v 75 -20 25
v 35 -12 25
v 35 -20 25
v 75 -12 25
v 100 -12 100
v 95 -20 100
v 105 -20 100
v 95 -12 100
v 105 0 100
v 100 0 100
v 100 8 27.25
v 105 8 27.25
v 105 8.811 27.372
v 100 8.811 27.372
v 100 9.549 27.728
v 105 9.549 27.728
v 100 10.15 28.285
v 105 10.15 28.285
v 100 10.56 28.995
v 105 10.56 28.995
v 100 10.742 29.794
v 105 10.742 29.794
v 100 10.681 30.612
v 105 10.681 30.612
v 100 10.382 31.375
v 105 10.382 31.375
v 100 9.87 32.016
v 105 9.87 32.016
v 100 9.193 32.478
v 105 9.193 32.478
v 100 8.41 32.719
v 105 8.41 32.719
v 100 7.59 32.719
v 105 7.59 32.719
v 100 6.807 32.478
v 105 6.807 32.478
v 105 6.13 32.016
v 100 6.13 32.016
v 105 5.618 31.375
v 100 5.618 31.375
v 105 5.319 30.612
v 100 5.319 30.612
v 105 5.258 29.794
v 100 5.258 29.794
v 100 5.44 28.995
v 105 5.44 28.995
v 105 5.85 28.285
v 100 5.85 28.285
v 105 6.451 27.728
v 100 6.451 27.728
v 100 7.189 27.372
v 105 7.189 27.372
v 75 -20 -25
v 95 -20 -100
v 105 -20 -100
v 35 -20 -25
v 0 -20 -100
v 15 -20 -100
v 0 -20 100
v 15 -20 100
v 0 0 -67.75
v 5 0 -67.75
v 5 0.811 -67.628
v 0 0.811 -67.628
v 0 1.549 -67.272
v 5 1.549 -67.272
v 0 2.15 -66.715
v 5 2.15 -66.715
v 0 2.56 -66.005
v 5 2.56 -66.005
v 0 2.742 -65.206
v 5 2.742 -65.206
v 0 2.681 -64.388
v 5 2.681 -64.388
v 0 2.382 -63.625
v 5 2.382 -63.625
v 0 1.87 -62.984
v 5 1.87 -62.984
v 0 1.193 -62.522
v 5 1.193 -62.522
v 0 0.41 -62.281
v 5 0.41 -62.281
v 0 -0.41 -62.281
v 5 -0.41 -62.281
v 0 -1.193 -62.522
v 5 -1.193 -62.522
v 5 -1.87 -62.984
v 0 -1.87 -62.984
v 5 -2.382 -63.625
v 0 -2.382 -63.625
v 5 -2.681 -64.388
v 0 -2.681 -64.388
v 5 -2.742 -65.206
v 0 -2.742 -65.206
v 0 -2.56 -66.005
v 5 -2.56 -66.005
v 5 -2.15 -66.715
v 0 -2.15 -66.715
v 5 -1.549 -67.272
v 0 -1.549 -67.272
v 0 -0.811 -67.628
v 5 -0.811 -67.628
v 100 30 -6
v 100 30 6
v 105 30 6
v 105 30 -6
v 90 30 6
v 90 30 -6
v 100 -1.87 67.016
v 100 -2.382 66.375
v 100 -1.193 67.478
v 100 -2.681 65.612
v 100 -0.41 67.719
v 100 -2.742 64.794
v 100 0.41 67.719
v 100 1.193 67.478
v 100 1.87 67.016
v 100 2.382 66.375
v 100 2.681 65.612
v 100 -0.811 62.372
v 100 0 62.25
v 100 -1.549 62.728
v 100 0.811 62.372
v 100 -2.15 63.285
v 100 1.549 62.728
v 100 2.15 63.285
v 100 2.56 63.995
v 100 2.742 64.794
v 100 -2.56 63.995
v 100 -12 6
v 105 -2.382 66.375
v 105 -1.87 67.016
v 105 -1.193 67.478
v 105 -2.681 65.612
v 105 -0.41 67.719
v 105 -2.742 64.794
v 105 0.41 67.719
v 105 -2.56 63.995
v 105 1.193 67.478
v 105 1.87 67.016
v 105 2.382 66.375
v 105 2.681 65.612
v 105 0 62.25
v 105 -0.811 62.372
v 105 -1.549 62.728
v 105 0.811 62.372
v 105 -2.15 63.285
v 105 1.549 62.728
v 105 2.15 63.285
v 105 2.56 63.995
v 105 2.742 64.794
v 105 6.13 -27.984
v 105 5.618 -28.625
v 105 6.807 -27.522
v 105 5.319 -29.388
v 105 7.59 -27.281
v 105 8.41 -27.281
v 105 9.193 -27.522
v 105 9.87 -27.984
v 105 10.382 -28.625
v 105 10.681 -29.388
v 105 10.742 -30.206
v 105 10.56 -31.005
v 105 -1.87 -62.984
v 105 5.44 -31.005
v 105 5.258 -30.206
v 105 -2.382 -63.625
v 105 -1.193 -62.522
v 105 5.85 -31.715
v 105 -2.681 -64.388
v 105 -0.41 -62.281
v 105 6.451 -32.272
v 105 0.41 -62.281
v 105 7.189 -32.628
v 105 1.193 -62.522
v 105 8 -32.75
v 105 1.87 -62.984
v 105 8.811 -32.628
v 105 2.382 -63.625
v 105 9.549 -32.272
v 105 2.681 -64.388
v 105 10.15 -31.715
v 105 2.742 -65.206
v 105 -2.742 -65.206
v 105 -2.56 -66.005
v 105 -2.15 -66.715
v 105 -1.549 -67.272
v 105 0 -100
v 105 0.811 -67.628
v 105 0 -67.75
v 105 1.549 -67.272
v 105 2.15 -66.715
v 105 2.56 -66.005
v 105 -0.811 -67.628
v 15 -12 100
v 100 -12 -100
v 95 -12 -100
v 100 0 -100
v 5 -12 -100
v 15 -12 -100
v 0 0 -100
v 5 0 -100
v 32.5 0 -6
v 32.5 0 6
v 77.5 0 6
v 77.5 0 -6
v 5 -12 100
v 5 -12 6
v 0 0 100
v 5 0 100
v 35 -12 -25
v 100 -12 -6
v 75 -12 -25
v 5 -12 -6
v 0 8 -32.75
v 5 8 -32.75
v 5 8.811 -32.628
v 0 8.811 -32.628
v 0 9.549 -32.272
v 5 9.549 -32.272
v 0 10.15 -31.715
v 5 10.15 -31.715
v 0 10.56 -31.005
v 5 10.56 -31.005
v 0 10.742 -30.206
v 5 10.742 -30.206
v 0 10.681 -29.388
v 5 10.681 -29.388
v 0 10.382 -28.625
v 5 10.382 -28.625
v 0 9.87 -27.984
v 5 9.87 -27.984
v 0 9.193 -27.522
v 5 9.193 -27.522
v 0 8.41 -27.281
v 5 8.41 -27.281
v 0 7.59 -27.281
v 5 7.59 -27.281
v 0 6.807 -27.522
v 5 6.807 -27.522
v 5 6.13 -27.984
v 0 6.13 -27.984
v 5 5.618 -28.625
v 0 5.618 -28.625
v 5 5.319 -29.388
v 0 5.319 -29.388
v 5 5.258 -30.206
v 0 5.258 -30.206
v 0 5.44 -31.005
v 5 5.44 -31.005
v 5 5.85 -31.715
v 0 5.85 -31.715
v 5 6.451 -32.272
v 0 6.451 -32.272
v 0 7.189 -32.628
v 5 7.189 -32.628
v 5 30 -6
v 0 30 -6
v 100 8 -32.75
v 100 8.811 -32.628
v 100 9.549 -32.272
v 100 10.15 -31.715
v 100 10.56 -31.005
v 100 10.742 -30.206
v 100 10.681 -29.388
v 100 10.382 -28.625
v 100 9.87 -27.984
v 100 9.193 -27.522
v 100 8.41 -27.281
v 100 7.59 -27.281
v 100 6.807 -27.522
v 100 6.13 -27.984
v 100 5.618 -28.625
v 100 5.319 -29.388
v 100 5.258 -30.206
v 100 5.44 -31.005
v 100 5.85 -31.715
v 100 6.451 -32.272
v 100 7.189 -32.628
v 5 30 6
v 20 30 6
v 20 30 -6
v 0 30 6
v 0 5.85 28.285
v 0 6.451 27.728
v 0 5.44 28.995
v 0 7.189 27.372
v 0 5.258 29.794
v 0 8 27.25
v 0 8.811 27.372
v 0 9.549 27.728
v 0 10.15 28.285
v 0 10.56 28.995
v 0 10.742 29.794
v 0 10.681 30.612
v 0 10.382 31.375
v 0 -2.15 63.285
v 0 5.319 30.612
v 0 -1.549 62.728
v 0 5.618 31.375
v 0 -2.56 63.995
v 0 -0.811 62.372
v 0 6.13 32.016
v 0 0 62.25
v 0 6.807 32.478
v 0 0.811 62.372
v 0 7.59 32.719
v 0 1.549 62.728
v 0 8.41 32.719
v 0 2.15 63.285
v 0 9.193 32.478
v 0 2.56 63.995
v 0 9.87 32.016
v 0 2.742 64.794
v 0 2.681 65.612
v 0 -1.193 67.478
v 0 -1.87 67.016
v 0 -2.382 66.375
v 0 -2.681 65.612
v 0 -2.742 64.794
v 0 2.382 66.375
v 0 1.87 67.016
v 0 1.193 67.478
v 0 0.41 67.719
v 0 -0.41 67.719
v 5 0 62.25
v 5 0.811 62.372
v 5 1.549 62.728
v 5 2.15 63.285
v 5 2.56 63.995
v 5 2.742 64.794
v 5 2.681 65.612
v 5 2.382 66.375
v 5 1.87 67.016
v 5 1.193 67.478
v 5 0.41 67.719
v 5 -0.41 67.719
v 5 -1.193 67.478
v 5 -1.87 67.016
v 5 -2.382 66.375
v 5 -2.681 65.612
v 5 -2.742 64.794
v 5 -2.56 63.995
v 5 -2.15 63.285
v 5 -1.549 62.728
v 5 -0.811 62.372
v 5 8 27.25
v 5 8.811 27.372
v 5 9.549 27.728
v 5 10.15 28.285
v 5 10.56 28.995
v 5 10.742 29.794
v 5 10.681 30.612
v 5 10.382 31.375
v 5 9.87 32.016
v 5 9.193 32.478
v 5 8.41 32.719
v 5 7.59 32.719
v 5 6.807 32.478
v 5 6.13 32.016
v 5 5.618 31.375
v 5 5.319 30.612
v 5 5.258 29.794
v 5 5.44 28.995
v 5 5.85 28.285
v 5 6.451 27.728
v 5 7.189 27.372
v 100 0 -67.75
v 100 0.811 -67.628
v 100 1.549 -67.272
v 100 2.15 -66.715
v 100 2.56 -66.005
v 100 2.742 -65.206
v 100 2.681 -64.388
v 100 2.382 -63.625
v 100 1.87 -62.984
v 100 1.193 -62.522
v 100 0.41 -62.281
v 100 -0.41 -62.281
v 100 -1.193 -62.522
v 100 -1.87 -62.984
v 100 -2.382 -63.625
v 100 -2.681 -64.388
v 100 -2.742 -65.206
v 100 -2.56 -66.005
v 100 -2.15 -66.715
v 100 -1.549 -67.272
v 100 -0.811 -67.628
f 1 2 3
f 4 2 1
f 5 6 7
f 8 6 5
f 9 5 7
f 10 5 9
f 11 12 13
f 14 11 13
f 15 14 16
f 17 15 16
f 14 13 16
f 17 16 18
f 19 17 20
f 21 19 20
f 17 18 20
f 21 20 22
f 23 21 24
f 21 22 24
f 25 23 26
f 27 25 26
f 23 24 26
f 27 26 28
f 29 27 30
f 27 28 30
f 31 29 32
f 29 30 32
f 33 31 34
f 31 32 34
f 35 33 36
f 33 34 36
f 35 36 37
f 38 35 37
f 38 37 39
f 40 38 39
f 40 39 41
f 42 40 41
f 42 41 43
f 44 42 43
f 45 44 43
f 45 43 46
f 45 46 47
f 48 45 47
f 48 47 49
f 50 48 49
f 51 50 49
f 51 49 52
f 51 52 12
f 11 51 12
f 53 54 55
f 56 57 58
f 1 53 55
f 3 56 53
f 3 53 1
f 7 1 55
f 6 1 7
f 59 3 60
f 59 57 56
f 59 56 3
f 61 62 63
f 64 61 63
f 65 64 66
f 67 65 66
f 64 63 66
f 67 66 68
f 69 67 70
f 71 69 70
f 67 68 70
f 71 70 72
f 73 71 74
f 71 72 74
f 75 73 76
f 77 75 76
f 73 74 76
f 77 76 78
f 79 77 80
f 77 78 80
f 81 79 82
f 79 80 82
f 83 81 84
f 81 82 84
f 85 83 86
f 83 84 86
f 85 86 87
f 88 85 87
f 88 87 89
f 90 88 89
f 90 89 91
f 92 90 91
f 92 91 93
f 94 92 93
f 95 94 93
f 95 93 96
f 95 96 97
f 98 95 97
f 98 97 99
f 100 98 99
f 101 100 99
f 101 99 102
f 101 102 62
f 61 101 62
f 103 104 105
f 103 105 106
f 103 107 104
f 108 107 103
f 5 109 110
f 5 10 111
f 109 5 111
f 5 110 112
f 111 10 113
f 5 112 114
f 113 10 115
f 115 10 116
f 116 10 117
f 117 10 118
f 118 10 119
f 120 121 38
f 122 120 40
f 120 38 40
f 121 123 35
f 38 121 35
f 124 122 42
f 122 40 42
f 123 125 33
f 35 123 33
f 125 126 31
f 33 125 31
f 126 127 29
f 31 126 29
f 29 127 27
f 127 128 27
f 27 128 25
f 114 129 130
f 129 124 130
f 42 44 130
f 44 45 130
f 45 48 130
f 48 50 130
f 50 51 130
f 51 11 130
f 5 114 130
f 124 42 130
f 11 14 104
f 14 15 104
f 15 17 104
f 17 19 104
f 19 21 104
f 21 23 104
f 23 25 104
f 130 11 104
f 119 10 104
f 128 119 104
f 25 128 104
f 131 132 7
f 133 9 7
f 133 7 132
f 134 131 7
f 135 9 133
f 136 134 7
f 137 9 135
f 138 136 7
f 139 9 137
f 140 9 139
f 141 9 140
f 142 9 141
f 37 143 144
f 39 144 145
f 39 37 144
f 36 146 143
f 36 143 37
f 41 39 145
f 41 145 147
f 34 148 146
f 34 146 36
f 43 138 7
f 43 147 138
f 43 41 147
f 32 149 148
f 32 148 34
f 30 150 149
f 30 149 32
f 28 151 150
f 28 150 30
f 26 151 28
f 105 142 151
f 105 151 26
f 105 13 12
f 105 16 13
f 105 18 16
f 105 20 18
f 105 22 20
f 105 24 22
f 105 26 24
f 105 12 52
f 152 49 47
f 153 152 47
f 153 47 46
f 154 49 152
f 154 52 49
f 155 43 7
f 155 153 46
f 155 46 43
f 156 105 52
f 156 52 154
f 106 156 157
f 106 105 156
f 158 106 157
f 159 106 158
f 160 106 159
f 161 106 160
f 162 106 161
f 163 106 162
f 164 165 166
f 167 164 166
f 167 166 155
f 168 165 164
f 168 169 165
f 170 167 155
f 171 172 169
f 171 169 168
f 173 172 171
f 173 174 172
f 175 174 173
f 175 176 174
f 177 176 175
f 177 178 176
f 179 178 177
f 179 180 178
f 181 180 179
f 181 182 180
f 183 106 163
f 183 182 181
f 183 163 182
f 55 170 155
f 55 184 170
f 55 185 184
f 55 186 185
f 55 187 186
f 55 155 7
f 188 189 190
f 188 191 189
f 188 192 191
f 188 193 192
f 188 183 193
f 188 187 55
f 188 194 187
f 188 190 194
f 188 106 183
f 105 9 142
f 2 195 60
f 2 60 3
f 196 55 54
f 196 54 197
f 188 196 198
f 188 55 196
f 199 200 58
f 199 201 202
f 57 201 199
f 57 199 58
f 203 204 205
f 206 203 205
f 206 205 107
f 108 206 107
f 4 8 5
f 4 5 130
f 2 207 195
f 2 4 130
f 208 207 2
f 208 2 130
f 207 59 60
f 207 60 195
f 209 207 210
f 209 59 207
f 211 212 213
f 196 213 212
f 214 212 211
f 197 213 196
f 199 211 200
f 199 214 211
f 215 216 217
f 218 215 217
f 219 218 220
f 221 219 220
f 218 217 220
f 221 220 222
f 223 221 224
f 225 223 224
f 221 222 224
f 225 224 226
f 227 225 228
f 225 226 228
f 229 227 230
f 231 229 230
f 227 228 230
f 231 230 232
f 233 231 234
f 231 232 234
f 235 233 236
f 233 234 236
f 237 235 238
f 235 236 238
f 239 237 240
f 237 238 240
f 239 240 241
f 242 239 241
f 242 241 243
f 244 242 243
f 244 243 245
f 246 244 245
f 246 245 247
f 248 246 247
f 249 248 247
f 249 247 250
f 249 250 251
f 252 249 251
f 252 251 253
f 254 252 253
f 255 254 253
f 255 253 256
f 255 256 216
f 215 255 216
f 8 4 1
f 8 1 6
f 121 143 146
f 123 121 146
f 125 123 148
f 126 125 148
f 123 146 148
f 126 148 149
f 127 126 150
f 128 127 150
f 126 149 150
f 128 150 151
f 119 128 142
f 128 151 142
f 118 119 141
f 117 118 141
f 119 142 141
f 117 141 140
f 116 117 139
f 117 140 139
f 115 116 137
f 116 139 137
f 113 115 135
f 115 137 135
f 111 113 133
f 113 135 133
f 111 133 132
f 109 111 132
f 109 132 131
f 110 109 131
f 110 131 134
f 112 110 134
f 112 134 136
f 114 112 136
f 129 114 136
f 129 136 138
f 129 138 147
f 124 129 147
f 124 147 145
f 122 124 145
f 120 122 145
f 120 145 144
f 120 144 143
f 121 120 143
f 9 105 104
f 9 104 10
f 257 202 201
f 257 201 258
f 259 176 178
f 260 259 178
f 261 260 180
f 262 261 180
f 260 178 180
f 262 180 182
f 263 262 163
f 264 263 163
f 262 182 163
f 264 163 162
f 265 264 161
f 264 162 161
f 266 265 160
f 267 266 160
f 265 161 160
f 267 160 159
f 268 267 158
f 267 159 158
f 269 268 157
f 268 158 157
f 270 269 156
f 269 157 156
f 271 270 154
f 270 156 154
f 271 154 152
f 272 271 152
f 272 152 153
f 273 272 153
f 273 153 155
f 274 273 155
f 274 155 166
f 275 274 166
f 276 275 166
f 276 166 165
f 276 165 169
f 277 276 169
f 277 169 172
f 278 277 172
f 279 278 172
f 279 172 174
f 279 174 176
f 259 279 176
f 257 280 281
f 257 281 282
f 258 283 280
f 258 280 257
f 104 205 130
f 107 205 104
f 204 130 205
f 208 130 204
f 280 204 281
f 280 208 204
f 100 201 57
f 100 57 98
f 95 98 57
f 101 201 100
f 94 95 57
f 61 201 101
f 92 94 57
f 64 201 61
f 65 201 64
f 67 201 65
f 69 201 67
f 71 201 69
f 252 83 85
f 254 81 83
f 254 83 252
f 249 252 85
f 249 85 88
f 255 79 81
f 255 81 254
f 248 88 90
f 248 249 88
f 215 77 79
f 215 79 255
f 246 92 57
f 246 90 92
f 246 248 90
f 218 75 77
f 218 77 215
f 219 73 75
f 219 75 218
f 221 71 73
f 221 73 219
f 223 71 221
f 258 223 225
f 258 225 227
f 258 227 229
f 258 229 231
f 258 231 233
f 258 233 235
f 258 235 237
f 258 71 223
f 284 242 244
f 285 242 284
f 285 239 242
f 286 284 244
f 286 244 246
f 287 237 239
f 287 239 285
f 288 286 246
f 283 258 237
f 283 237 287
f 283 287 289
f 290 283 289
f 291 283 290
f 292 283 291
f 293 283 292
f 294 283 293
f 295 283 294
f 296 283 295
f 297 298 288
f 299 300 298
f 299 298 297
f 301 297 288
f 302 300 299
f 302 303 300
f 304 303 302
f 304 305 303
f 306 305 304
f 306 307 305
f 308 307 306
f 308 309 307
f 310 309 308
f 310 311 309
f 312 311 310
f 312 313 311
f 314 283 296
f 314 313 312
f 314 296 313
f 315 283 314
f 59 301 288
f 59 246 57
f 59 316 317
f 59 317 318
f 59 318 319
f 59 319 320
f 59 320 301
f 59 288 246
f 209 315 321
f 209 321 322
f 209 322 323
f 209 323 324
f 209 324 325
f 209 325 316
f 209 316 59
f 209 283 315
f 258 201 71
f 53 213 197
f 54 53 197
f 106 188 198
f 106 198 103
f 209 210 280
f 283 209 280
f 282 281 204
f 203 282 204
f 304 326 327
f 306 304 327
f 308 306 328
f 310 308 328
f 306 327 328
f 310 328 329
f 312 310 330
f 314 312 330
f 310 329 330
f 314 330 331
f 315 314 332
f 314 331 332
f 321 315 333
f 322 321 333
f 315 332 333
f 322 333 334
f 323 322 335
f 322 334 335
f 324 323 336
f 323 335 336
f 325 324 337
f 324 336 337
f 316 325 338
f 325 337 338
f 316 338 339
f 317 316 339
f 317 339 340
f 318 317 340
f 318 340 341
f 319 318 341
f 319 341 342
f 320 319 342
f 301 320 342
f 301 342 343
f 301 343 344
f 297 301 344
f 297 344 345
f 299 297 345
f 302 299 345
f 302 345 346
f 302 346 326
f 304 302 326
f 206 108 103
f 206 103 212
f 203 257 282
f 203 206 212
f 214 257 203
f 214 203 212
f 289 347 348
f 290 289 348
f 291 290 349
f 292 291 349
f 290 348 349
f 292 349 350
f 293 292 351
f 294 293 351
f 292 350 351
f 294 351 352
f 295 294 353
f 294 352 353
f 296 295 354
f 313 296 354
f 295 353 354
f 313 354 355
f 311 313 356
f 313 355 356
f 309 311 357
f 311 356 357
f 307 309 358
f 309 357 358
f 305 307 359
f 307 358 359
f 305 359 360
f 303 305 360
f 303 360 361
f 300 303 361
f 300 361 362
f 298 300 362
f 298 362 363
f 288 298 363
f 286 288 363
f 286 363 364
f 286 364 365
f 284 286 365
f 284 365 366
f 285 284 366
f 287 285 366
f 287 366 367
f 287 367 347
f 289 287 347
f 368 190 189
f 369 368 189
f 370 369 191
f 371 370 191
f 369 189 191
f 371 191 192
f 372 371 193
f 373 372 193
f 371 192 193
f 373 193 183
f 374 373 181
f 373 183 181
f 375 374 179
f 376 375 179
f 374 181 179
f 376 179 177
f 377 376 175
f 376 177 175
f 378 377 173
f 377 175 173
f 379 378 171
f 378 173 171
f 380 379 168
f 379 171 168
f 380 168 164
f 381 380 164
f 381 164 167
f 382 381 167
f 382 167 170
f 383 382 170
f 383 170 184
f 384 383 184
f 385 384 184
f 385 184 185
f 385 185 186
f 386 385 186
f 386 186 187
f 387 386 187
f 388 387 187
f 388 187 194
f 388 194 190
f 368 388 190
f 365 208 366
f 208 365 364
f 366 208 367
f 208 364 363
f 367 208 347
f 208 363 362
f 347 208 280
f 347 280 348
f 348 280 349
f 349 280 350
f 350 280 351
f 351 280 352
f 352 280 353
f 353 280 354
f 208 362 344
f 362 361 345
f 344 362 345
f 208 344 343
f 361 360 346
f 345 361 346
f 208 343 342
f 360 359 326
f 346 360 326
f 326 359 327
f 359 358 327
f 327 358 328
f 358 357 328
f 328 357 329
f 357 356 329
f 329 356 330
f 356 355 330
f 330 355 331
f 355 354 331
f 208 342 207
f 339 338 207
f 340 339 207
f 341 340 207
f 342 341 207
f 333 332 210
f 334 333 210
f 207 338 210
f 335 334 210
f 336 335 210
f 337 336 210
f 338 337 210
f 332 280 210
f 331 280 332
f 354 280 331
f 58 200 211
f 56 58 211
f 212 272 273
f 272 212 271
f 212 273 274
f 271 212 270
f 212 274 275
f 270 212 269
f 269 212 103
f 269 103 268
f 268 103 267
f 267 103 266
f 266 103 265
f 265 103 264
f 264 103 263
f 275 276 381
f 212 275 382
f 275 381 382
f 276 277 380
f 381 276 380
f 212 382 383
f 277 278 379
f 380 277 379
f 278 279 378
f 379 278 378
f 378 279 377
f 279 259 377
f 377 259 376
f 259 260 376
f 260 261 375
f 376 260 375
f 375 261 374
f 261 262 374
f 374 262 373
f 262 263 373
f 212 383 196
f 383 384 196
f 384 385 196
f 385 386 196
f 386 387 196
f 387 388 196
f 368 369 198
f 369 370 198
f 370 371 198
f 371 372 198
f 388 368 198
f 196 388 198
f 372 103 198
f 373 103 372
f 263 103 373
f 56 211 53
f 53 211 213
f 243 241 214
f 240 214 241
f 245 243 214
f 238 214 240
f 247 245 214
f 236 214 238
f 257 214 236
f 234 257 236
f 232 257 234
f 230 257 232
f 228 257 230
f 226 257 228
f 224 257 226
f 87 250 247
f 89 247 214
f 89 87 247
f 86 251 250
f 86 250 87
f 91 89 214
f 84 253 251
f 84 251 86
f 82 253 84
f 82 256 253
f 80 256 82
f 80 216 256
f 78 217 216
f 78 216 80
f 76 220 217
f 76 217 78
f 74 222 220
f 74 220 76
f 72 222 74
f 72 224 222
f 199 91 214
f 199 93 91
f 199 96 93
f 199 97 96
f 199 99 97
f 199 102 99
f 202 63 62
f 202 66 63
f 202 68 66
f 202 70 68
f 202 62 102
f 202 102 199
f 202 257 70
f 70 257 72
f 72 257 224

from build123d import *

# Parameters (mm, degrees)
EXTRUDE_1_DEPTH     = 5
EXTRUDE_2_DEPTH     = 100
CUT_EXTRUDE_1_DEPTH = 100
CUT_EXTRUDE_2_DEPTH = 100
EXTRUDE_3_DEPTH     = 5
EXTRUDE_4_DEPTH     = 5
SKETCH_9_R          = 2.75
CUT_EXTRUDE_3_DEPTH = 149.07092895


with BuildPart() as part:
    # 草图1 → 凸台-拉伸1 (new body)
    with BuildSketch(Plane(origin=(0, 0, 0), x_dir=(0, 0, -1), z_dir=(1, 0, 0))):
        Polygon((6, 0), (100, 0), (100, -20), (-100, -20), (-100, 0), (-6, 0), (-6, 30), (6, 30), align=None)
    extrude(amount=EXTRUDE_1_DEPTH)

    # 草图2 → 凸台-拉伸2 (add)
    with BuildSketch(Plane(origin=(5, 0, 0), x_dir=(0, 0, -1), z_dir=(1, 0, 0))):
        Polygon((-6, -12), (-6, 30), (6, 30), (6, -12), (100, -12), (100, -20), (-100, -20), (-100, -12), align=None)
    extrude(amount=EXTRUDE_2_DEPTH)

    # 草图3 → 切除-拉伸1 (cut)
    with BuildSketch(Plane(origin=(0, -12, 0), x_dir=(1, 0, 0), z_dir=(0, 1, 0))):
        Polygon((15, 100), (35, 25), (75, 25), (95, 100), align=None)
        Polygon((15, -100), (35, -25), (75, -25), (95, -100), align=None)
    extrude(amount=-CUT_EXTRUDE_1_DEPTH, mode=Mode.SUBTRACT)

    # 草图5 → 切除-拉伸2 (cut)
    with BuildSketch(Plane.XY.offset(6)):
        Polygon((20, 30), (32.5, 0), (77.5, 0), (90, 30), align=None)
    extrude(amount=-CUT_EXTRUDE_2_DEPTH, mode=Mode.SUBTRACT)

    # 草图6 → 凸台-拉伸3 (add)
    with BuildSketch(Plane(origin=(5, 0, 0), x_dir=(0, 0, -1), z_dir=(1, 0, 0))):
        Polygon((-100, 0), (-6, 30), (-6, 0), align=None)
        Polygon((6, 0), (100, 0), (6, 30), align=None)
    extrude(amount=-EXTRUDE_3_DEPTH)

    # 草图7 → 凸台-拉伸4 (add)
    with BuildSketch(Plane(origin=(105, 0, 0), x_dir=(0, 0, -1), z_dir=(1, 0, 0))):
        Polygon((6, 30), (6, -12), (100, -12), (100, 0), align=None)
        Polygon((-100, -12), (-6, -12), (-6, 30), (-100, 0), align=None)
    extrude(amount=-EXTRUDE_4_DEPTH)

    # 草图9 → 切除-拉伸3 (cut, through all)
    with BuildSketch(Plane(origin=(105, 0, 0), x_dir=(0, 0, -1), z_dir=(1, 0, 0))):
        with Locations((30, 8)):
            Circle(SKETCH_9_R)
        with Locations((65, 0)):
            Circle(SKETCH_9_R)
        with Locations((-65, 0)):
            Circle(SKETCH_9_R)
        with Locations((-30, 8)):
            Circle(SKETCH_9_R)
    extrude(amount=-CUT_EXTRUDE_3_DEPTH, mode=Mode.SUBTRACT)


solid = part.part
